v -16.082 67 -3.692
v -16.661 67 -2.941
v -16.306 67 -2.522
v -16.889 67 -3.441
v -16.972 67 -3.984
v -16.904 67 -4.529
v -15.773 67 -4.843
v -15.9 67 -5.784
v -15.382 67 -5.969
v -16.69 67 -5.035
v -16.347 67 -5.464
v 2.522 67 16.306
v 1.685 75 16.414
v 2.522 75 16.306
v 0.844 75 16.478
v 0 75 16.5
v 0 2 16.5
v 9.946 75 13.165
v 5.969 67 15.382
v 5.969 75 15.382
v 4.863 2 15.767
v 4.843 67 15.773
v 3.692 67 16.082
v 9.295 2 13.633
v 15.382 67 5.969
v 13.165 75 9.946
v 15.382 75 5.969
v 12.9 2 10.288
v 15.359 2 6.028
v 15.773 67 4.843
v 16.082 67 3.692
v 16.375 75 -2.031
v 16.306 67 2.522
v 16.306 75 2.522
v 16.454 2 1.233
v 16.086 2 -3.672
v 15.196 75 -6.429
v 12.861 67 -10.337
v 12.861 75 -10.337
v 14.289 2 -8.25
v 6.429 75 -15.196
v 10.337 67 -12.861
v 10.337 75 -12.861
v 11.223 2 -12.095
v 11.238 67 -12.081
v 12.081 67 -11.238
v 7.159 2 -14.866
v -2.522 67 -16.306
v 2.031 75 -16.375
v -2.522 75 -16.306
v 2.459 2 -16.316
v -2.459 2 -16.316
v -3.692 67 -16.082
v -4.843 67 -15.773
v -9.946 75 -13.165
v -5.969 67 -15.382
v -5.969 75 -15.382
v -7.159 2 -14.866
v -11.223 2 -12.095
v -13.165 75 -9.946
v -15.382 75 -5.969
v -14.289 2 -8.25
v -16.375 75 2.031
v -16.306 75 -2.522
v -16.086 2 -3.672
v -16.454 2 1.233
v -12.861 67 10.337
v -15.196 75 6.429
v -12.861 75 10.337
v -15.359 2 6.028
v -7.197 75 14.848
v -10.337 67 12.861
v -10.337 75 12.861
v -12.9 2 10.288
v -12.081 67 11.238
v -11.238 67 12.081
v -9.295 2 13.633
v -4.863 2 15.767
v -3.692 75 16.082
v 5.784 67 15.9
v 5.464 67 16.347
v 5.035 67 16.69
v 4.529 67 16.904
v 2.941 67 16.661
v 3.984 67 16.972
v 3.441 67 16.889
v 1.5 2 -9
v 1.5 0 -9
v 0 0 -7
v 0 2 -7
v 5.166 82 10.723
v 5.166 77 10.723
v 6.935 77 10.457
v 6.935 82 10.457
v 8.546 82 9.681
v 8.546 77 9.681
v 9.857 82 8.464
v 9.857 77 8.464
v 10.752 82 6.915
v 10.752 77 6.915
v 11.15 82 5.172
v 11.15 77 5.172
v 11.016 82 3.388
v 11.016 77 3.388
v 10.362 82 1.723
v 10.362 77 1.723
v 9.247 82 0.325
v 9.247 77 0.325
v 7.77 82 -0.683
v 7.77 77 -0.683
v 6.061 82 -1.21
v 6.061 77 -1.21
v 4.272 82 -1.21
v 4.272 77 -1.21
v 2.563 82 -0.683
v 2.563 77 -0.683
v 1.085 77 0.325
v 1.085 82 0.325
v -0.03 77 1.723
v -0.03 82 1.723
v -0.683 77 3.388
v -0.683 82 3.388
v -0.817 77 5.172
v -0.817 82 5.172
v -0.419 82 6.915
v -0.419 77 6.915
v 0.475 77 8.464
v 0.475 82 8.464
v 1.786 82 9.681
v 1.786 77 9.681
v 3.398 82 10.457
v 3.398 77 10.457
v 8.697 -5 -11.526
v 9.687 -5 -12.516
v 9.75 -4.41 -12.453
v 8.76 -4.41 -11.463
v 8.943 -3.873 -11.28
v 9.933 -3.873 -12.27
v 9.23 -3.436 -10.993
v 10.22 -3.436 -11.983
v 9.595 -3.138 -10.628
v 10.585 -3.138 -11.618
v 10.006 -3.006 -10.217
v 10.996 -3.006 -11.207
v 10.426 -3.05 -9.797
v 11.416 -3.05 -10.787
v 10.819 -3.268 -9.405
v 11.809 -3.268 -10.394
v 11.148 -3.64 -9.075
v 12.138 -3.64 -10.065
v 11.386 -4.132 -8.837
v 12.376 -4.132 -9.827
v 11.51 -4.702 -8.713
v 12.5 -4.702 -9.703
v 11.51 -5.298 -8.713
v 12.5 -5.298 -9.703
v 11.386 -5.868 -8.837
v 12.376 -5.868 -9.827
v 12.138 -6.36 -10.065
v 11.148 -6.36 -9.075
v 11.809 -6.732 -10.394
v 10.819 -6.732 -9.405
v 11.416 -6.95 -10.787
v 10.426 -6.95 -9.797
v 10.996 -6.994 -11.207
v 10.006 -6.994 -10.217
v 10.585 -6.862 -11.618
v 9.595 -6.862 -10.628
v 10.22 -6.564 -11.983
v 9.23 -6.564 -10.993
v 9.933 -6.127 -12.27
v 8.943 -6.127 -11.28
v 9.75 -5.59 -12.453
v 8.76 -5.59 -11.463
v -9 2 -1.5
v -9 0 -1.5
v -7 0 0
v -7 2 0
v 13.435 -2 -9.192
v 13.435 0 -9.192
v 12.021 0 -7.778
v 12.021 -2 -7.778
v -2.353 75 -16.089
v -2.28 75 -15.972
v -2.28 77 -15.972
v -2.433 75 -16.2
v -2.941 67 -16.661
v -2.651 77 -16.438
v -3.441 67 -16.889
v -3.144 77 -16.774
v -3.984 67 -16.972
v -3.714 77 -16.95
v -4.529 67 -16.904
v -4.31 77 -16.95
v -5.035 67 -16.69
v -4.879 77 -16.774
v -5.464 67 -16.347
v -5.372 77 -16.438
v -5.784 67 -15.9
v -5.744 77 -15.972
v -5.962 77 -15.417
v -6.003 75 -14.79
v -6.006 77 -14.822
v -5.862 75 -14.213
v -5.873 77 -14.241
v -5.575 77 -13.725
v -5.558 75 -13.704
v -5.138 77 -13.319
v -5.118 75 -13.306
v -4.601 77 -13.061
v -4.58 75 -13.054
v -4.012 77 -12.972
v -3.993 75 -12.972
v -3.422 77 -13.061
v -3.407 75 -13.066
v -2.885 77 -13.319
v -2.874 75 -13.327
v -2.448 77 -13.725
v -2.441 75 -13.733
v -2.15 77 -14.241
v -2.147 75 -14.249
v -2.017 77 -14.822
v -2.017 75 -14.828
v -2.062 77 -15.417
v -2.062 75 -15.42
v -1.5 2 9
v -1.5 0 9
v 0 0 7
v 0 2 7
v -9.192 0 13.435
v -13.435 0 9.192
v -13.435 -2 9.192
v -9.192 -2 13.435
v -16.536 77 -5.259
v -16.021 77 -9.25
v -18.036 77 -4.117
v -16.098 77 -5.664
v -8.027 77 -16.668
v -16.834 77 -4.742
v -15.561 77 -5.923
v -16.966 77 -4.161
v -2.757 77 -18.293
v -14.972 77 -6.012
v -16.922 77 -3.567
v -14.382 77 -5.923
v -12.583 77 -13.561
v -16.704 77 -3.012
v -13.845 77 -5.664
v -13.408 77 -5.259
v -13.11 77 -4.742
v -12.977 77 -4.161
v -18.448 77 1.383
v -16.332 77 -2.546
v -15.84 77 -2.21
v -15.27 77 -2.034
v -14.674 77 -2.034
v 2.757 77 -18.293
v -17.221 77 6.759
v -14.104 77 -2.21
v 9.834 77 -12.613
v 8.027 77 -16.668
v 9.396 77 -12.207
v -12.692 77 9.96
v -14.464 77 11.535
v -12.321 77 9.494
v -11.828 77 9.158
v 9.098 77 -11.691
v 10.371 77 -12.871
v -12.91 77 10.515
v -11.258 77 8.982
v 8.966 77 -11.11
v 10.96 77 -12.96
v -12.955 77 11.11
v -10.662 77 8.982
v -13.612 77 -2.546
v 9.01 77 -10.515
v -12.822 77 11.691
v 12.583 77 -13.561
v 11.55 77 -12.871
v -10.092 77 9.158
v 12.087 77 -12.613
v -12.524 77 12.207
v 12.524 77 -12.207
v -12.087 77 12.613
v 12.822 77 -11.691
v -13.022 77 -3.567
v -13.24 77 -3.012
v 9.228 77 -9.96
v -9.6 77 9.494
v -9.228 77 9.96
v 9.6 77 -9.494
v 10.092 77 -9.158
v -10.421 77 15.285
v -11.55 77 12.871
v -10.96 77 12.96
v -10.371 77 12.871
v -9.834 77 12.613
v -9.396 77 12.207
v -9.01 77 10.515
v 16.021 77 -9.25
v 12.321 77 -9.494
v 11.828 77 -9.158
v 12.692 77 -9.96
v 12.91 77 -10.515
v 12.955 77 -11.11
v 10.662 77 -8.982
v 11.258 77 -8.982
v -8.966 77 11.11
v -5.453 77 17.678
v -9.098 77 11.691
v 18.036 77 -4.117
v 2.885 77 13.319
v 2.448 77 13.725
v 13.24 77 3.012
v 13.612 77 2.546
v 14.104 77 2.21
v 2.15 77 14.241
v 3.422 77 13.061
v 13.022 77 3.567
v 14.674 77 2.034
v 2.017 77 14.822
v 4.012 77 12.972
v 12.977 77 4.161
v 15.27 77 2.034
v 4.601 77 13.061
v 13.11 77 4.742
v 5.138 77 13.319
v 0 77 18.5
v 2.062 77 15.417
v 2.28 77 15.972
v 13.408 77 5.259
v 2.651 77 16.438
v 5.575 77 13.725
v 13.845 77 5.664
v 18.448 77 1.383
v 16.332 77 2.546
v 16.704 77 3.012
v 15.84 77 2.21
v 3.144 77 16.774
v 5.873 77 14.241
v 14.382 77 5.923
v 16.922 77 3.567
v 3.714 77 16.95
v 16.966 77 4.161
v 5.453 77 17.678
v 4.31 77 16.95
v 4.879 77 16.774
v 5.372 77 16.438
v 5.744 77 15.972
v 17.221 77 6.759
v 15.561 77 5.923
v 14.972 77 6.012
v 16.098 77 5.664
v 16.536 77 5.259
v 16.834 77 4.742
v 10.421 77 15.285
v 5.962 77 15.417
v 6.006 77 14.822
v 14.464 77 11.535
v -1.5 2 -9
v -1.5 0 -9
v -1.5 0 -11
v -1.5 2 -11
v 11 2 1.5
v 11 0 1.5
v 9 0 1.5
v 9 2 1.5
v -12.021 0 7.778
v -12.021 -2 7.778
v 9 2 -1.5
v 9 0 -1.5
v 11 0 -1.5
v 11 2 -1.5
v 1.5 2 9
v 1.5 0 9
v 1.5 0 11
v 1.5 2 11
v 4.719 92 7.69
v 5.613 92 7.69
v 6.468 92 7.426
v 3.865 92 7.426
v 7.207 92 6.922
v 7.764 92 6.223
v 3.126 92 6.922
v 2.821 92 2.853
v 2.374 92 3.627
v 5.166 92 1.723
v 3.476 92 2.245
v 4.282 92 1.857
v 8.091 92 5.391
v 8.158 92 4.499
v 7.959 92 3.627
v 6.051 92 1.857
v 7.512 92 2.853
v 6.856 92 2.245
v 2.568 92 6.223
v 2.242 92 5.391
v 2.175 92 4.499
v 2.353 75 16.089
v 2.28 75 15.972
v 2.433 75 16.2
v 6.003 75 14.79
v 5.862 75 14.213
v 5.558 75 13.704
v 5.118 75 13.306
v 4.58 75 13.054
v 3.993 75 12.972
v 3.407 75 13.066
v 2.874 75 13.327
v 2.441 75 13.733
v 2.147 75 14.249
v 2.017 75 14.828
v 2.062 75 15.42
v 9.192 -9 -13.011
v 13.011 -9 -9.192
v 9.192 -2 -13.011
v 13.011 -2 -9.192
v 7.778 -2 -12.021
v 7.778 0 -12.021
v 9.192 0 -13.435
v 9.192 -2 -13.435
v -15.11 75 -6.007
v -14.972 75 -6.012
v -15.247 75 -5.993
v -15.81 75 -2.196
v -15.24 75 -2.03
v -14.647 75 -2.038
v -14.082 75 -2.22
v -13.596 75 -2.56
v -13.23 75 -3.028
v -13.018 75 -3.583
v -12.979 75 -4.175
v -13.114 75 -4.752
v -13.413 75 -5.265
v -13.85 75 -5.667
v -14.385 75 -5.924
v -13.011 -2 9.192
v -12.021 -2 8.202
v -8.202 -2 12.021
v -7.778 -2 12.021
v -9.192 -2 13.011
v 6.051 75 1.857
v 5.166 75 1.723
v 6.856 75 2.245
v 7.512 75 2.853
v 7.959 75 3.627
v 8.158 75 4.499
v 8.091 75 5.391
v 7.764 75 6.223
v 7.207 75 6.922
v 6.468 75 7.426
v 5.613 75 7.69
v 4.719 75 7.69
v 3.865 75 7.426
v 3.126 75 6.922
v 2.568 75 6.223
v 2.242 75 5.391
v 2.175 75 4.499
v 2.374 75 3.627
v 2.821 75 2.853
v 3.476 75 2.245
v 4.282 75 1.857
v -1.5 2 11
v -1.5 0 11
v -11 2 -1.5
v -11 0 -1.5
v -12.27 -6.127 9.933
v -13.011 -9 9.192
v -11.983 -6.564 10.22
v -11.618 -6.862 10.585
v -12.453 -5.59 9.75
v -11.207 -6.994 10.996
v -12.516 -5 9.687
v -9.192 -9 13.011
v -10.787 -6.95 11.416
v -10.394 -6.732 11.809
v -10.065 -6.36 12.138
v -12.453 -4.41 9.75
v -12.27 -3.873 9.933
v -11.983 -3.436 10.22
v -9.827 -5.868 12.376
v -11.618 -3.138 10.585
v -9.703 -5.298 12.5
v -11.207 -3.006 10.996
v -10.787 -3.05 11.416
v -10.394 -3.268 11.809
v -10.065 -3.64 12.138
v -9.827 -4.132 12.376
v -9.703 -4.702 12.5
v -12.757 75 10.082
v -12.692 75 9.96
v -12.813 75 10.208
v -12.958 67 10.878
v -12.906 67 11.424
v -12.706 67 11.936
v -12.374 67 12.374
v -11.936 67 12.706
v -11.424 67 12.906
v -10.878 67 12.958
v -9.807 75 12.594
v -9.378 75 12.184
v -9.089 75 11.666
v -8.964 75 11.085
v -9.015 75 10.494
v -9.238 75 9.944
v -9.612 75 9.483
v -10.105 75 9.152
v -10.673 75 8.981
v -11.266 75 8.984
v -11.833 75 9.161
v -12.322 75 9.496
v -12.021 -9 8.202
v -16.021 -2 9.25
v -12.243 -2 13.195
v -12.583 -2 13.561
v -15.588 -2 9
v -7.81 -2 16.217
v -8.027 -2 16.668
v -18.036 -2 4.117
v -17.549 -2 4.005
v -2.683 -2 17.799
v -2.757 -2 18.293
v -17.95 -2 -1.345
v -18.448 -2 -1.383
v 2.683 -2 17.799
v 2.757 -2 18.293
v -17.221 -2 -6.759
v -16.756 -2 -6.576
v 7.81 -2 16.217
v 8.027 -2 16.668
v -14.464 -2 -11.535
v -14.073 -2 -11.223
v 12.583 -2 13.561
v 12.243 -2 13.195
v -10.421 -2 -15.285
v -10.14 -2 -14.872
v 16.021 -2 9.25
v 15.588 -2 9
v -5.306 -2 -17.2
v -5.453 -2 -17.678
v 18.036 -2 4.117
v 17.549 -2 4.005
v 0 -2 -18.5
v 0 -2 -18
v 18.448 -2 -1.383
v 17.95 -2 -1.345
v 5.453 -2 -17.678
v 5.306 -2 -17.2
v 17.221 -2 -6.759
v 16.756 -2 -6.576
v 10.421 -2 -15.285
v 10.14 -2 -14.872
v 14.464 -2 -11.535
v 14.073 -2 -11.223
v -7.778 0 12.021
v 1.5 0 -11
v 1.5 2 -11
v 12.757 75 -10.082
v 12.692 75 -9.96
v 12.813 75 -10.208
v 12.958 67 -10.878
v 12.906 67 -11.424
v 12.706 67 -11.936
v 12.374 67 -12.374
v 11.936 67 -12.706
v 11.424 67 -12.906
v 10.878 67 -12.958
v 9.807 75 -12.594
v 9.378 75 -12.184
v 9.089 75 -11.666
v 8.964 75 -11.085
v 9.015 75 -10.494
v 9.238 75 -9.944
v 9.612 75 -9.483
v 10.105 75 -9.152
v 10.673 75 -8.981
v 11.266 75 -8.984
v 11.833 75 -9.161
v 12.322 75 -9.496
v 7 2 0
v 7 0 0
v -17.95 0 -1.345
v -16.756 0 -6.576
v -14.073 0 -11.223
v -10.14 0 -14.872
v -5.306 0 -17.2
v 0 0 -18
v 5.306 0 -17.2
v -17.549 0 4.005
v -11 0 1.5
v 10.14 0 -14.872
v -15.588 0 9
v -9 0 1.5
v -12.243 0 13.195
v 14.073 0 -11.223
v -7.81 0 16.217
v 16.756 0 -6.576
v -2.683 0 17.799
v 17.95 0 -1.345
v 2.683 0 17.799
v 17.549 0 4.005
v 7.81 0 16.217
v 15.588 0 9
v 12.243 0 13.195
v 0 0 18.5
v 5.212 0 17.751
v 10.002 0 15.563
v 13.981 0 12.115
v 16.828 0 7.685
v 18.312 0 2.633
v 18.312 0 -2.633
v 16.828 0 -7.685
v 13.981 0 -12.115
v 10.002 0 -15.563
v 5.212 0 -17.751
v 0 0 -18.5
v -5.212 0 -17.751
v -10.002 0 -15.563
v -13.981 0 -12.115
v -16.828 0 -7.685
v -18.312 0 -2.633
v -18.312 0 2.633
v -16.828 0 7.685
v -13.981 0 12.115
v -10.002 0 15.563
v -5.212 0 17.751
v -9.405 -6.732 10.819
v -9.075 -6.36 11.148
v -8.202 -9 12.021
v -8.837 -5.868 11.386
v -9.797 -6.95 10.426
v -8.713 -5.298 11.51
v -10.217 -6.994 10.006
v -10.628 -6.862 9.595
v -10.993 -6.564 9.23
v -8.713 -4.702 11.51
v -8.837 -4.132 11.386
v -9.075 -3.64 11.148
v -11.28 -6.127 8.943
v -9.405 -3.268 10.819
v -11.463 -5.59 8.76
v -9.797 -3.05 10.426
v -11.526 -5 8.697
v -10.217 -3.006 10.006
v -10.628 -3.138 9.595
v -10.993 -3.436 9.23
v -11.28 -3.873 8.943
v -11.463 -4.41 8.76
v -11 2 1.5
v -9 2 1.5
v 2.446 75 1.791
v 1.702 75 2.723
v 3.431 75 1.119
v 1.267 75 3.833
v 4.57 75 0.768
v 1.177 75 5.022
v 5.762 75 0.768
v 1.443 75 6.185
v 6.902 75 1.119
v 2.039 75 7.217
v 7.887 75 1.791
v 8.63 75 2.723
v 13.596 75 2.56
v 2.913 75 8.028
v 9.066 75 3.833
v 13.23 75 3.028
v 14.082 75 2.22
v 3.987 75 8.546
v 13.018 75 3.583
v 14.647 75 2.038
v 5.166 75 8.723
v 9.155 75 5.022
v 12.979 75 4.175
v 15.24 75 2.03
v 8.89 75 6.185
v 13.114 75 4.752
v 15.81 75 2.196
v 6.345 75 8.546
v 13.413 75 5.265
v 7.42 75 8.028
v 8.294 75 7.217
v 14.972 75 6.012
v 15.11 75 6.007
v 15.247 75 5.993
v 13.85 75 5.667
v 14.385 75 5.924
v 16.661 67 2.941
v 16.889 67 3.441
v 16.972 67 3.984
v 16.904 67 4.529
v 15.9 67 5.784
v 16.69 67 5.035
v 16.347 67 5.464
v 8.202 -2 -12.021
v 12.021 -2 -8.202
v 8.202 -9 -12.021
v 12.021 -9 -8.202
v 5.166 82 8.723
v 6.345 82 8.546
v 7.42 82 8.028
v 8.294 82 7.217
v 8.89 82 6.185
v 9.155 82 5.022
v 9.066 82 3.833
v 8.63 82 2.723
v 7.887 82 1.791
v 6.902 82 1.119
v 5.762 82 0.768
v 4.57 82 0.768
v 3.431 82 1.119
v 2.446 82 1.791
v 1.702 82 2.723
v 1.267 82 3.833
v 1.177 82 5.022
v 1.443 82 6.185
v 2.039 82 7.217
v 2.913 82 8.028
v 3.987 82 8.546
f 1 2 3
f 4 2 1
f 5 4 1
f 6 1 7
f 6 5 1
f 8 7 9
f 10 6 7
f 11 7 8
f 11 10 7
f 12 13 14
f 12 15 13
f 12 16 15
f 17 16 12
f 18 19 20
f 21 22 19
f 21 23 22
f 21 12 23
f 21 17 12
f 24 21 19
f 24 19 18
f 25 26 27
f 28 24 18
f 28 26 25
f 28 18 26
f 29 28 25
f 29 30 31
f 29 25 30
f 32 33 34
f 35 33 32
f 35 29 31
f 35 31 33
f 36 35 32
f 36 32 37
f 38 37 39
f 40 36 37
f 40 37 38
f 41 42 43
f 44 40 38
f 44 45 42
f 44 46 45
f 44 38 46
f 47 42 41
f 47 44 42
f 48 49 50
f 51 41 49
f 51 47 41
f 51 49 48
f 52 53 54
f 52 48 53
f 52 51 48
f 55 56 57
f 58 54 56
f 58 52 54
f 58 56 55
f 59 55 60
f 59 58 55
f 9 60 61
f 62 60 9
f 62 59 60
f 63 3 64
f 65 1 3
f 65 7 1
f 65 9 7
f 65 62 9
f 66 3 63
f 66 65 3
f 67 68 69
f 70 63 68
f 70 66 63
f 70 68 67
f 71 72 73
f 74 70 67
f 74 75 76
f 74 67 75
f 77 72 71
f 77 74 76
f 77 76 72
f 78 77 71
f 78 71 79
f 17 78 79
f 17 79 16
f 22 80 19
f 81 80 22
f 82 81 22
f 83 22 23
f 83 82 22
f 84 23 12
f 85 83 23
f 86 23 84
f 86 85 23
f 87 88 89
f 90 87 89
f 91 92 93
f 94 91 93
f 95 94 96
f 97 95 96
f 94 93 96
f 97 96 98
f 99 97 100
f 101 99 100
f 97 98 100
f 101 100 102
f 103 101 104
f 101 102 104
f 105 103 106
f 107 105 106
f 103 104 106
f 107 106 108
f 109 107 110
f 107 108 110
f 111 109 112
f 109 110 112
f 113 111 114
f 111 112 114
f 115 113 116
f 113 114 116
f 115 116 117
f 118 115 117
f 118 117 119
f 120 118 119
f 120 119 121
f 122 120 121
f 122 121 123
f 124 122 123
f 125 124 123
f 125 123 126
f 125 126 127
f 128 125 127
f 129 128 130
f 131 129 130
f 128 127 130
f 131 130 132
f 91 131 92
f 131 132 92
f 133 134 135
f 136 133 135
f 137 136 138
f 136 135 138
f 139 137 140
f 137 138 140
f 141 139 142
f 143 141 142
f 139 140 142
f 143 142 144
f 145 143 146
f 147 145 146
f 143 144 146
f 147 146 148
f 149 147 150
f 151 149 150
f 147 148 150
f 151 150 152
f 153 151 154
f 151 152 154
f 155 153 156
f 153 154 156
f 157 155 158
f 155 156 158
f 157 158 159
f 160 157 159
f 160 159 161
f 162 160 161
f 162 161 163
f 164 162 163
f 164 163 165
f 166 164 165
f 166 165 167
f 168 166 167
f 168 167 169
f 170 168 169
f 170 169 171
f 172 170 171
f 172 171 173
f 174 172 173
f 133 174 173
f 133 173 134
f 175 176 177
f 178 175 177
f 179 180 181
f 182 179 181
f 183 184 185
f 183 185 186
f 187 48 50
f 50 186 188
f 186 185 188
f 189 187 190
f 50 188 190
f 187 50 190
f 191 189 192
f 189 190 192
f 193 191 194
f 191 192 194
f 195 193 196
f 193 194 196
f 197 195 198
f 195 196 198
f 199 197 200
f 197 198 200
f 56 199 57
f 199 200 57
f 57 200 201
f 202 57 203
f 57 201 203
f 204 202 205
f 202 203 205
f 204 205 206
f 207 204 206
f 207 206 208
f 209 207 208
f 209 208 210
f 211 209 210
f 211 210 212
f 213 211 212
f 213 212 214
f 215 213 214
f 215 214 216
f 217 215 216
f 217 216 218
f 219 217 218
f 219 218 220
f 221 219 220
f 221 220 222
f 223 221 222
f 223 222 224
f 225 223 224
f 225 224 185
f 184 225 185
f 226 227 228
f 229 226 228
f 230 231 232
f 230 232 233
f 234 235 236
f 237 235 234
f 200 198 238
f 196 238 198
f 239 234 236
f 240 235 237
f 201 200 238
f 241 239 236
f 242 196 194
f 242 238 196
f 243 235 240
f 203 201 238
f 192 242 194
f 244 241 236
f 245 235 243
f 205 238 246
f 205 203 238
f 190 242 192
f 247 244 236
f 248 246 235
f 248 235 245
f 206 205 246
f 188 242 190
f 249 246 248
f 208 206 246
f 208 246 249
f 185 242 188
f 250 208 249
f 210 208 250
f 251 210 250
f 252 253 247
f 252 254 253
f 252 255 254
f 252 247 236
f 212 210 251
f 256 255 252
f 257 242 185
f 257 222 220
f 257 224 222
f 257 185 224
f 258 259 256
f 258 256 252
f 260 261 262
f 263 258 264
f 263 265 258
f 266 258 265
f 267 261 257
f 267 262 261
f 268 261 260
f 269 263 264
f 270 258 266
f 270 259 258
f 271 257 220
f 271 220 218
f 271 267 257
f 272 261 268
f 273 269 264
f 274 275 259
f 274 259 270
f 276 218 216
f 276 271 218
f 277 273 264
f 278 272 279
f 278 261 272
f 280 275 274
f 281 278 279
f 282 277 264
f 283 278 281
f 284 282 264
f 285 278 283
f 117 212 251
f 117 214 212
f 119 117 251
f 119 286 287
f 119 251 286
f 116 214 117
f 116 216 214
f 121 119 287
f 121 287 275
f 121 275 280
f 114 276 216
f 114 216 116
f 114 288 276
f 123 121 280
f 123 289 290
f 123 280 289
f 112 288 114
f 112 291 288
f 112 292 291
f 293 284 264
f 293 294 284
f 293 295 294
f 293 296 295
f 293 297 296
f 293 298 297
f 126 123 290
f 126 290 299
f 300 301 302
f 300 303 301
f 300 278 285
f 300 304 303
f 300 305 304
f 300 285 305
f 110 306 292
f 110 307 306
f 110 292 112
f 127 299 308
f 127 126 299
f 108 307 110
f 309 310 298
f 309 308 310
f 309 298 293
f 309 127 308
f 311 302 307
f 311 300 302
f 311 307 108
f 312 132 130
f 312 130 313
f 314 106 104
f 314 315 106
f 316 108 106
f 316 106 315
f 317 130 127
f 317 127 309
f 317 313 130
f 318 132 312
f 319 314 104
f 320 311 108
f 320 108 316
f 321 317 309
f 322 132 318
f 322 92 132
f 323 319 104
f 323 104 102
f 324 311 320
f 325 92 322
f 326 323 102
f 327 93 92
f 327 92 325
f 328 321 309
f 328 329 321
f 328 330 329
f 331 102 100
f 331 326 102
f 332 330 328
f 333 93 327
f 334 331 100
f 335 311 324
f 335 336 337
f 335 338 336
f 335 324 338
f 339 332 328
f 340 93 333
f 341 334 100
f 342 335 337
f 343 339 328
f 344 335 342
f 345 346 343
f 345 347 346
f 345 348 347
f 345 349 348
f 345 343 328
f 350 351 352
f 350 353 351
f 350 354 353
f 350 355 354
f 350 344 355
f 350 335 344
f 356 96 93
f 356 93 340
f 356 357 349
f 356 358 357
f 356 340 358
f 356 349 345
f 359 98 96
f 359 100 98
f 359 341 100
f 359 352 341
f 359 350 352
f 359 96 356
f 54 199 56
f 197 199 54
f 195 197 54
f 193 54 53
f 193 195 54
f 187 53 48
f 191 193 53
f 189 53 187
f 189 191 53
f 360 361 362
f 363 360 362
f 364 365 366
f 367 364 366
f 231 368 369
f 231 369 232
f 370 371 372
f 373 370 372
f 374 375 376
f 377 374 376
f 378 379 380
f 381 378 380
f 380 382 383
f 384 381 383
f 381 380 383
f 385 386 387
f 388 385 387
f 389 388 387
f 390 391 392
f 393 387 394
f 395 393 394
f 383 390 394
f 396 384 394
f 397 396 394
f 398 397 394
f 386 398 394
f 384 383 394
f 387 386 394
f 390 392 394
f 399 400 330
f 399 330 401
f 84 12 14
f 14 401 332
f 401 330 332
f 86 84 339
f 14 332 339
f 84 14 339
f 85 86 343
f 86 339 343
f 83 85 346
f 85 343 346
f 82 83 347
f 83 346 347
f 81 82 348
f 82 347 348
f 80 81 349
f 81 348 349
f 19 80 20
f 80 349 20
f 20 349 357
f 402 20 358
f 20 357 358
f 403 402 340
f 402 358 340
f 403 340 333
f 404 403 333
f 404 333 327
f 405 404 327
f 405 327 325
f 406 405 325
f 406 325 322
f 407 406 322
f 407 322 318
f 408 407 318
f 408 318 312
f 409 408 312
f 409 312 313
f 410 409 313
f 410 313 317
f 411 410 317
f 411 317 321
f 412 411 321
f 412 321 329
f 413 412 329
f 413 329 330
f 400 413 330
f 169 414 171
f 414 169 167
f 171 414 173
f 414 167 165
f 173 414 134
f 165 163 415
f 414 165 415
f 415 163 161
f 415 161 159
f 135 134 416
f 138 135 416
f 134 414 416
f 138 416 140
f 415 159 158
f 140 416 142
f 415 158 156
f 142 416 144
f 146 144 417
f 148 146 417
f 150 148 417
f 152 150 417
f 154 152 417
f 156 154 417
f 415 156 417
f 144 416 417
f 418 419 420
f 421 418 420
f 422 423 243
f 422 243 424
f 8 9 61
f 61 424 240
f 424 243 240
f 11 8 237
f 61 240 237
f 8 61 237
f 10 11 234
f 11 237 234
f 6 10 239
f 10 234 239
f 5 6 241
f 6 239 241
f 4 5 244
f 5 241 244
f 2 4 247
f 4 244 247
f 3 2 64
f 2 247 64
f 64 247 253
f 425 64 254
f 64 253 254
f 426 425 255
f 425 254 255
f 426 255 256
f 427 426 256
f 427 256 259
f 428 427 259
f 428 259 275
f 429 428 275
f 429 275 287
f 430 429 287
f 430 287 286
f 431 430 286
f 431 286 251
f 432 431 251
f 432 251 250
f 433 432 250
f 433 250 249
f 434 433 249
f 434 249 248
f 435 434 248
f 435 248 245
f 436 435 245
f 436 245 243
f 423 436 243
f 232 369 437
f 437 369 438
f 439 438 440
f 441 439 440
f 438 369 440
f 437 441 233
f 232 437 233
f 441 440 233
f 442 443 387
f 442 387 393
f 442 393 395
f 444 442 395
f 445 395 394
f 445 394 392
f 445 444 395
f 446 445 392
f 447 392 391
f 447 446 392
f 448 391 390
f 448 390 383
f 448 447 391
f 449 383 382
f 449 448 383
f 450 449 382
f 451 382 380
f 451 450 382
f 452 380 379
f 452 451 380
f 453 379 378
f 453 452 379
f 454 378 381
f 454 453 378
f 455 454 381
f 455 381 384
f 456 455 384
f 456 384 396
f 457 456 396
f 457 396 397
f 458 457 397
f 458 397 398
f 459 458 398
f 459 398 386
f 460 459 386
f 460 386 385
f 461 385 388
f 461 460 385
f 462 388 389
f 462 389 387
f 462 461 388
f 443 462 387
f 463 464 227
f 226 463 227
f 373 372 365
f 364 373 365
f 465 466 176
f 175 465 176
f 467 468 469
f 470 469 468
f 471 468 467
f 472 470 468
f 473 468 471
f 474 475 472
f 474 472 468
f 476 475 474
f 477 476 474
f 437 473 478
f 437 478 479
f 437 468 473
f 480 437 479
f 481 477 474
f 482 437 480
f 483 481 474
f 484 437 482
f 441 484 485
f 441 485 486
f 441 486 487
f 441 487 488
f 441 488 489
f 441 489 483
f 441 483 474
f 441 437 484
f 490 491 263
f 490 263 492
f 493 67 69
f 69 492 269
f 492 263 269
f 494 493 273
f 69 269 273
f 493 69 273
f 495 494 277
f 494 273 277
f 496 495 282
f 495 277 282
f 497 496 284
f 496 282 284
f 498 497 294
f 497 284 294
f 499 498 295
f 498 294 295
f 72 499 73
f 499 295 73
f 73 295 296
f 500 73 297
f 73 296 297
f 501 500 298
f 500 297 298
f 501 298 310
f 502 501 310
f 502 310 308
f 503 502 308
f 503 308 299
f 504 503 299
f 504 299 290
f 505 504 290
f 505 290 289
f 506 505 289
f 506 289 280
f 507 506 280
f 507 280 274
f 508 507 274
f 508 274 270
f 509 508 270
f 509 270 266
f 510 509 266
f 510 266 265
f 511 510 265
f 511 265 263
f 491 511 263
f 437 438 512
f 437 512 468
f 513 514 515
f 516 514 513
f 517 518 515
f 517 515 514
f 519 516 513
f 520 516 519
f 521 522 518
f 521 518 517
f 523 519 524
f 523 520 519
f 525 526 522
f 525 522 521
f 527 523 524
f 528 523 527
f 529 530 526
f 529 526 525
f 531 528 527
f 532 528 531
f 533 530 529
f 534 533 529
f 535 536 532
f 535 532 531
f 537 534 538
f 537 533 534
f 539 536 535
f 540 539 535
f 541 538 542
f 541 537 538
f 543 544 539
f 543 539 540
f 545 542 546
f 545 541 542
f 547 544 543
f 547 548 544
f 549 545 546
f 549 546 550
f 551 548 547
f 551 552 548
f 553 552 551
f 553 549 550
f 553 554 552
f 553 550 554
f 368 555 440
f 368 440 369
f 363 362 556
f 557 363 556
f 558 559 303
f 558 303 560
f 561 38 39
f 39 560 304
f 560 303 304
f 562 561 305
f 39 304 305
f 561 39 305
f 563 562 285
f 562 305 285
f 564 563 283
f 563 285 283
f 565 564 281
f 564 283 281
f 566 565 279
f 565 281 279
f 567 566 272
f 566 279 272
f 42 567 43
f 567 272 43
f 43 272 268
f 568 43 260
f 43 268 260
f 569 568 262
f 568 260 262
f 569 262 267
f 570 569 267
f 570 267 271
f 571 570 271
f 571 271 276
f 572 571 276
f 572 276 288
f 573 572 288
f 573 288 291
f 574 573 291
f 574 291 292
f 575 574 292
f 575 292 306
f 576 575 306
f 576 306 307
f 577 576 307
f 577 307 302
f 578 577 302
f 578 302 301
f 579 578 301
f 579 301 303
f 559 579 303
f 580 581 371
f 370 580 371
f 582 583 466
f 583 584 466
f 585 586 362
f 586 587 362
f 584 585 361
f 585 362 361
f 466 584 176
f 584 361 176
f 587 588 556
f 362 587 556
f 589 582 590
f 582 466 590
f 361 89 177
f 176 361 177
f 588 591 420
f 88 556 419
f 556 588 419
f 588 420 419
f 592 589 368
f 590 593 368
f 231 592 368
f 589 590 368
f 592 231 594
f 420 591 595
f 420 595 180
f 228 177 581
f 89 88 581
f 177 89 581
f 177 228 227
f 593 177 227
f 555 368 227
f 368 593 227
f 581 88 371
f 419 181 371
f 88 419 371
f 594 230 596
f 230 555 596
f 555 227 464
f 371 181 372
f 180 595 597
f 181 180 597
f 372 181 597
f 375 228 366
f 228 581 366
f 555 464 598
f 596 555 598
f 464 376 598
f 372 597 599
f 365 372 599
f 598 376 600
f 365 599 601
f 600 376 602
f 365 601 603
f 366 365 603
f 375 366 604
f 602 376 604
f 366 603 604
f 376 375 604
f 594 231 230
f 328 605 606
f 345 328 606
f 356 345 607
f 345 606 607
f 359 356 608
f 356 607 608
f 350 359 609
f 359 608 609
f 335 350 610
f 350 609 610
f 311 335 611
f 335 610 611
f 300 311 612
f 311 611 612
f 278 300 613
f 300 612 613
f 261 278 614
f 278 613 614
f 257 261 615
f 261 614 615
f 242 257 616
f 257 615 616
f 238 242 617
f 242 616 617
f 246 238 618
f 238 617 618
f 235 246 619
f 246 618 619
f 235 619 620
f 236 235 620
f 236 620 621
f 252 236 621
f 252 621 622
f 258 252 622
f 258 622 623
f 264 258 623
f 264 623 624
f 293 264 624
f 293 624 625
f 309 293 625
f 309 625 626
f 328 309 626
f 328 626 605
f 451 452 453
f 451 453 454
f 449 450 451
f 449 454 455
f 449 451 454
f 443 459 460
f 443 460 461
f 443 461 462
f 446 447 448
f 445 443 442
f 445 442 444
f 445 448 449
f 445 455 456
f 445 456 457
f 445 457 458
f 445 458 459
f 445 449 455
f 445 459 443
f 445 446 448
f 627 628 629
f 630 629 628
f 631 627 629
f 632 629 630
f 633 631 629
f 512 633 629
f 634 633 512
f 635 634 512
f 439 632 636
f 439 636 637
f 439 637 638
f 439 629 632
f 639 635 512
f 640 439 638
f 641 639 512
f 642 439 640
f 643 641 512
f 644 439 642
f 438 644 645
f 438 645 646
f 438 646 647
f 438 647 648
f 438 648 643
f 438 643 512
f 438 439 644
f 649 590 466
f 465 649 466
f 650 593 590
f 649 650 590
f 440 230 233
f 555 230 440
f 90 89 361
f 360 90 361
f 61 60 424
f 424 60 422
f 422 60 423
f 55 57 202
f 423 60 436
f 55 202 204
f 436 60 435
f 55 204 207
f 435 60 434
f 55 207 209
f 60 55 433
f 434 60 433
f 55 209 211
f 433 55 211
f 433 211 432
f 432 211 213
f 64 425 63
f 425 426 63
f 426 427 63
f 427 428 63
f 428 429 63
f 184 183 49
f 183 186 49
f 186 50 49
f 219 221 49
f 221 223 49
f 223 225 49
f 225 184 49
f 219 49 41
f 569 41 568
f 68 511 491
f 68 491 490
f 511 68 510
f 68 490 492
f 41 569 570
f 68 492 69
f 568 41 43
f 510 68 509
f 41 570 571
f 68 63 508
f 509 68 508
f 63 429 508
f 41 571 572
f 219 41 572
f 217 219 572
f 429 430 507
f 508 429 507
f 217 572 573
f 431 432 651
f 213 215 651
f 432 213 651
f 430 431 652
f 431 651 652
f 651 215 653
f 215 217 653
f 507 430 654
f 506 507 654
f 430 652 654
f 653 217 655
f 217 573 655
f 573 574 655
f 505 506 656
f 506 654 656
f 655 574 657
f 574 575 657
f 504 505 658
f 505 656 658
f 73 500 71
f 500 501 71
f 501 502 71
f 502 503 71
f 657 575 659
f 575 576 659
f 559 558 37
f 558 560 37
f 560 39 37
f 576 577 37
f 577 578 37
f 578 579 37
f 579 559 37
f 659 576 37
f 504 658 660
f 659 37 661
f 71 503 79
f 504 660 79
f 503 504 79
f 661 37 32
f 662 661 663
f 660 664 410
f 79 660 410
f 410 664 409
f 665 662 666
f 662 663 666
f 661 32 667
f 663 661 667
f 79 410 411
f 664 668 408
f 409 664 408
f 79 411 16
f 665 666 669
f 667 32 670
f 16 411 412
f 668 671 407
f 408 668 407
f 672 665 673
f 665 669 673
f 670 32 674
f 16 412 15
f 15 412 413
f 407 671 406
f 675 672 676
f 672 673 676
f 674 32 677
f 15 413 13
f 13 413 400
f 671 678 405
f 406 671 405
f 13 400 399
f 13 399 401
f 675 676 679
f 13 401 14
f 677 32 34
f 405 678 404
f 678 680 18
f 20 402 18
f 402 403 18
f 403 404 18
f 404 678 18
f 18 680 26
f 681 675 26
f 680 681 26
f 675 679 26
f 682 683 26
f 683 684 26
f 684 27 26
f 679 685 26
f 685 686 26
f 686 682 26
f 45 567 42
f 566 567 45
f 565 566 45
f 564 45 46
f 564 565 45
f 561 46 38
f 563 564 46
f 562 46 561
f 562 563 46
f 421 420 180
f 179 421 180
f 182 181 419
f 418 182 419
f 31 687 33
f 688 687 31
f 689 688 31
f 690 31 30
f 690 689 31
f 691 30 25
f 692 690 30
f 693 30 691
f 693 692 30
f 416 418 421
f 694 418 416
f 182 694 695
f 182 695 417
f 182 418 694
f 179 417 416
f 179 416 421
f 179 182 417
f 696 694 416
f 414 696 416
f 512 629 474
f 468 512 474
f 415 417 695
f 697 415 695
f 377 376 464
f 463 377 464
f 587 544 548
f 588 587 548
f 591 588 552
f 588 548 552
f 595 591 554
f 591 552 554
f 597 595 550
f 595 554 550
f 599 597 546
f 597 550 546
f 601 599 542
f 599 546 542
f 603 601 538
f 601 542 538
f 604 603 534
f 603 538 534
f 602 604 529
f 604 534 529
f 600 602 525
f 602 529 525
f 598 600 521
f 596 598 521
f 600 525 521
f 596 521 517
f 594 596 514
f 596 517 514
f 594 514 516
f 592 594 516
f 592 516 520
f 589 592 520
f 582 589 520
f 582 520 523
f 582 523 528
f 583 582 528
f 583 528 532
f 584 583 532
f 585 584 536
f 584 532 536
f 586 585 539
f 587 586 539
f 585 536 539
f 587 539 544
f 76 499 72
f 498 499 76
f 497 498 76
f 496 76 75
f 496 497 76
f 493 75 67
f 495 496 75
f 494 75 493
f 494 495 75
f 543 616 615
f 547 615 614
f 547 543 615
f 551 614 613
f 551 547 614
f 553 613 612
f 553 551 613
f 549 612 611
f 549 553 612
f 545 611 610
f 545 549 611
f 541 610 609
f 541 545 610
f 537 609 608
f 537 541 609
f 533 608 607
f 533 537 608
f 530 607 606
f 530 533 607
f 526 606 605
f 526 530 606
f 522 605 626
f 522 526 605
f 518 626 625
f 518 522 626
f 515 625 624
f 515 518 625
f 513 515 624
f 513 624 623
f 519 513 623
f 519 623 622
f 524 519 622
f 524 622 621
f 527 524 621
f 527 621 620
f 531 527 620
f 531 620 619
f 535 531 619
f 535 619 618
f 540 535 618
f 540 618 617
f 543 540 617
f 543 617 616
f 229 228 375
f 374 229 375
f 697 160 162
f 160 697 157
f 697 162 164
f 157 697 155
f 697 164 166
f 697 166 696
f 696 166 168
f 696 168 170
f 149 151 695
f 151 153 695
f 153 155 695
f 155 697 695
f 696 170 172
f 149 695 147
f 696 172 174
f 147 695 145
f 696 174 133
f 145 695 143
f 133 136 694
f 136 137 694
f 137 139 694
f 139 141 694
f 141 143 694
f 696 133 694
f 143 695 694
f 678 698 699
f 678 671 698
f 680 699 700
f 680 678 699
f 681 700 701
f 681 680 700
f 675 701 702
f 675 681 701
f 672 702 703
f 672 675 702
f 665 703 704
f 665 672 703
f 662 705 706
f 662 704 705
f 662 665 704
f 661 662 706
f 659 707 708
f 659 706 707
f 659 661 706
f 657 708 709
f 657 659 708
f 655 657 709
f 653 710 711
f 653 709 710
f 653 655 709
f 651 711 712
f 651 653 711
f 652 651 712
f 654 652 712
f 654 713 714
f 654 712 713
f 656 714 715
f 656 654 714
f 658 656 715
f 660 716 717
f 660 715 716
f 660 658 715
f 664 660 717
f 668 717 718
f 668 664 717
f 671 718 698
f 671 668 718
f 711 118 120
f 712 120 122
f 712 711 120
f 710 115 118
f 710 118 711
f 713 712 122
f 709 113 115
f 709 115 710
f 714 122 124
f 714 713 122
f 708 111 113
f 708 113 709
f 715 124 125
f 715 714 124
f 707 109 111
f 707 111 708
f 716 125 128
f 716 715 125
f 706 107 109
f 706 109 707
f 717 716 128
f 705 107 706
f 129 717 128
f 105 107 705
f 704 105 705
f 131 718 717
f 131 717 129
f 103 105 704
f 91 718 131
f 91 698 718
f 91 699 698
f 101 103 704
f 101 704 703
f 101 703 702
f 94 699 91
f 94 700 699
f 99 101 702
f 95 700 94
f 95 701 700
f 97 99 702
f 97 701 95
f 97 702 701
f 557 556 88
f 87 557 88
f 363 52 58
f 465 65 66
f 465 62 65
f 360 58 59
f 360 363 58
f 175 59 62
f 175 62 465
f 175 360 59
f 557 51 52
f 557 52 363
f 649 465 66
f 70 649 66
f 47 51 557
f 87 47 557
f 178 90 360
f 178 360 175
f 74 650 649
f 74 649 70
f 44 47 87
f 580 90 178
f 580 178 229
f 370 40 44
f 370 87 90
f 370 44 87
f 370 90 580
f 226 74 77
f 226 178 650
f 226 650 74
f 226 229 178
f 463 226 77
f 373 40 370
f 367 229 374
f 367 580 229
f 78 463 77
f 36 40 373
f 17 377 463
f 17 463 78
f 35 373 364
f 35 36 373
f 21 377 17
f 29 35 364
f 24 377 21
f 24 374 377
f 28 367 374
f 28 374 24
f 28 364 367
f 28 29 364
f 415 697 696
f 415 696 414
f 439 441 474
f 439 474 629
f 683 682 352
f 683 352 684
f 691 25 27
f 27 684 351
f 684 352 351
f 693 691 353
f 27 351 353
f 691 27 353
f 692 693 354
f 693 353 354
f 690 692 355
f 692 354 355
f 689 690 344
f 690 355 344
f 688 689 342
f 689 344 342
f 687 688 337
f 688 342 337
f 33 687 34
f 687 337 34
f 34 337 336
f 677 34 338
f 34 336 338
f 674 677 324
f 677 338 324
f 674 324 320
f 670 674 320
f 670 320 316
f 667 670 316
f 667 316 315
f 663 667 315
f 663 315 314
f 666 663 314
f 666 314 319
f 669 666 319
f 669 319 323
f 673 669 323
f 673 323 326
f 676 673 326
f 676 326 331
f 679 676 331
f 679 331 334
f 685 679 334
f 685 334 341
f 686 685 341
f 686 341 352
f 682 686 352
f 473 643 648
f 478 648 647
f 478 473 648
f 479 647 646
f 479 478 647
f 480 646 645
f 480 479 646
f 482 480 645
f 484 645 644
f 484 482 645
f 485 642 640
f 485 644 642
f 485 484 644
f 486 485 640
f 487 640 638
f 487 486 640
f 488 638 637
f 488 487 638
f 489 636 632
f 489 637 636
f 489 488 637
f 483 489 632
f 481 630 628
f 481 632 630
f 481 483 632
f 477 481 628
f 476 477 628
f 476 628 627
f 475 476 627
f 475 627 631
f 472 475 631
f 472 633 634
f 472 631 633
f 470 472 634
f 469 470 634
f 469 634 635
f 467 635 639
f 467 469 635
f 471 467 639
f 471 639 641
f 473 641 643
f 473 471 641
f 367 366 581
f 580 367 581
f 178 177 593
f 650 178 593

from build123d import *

# Parameters (mm, degrees)
SKETCH_1_R               = 18.5
EXTRUDE_1_DEPTH          = 77
SKETCH_2_R               = 6
EXTRUDE_2_DEPTH          = 5
SHELL_1_T                = -2
CUT_EXTRUDE_1_DEPTH      = 5
PATTERN_CIRCULAR_1_COUNT = 4
EXTRUDE_START            = 2
SKETCH_4_R               = 18.5
SKETCH_4_R_2             = 18
EXTRUDE_3_DEPTH          = 2
EXTRUDE_4_DEPTH          = 2
EXTRUDE_5_DEPTH          = 7
SKETCH_7_R               = 2
CUT_EXTRUDE_2_DEPTH      = 7
SKETCH_8_R               = 3
EXTRUDE_6_DEPTH          = 17
SKETCH_10_R              = 2
CUT_EXTRUDE_3_DEPTH      = 10
PATTERN_CIRCULAR_2_COUNT = 6


with BuildPart() as part:
    # 草图1 → 凸台-拉伸1 (new body)
    with BuildSketch(Plane(origin=(0, 0, 0), x_dir=(1, 0, 0), z_dir=(0, 1, 0))):
        Circle(SKETCH_1_R)
    extrude(amount=EXTRUDE_1_DEPTH)

    # 草图2 → 凸台-拉伸2 (add)
    with BuildSketch(Plane(origin=(0, 77, 0), x_dir=(1, 0, 0), z_dir=(0, 1, 0))):
        with Locations((5.166313479, -4.723262118)):
            Circle(SKETCH_2_R)
    extrude(amount=EXTRUDE_2_DEPTH)

    # 抽壳1
    shell_1_openings = [part.faces().sort_by_distance(p)[0] for p in [
        (5.166313479, 82, 4.723262118),
    ]]
    offset(amount=SHELL_1_T, openings=shell_1_openings, kind=Kind.INTERSECTION)

    # 草图3 → 切除-拉伸1 (cut)
    with BuildSketch(Plane.XZ):
        Polygon((9, 1.5), (7, 0), (9, -1.5), (11, -1.5), (11, 1.5), align=None)
    cut_extrude_1 = extrude(amount=-CUT_EXTRUDE_1_DEPTH, mode=Mode.SUBTRACT)

    # 阵列(圆周)1: 切除-拉伸1 ×4 about axis
    pattern_circular_1_axis = Axis((0, 77, 0), (0, -1, 0))
    for i in range(1, PATTERN_CIRCULAR_1_COUNT):
        add(cut_extrude_1.rotate(pattern_circular_1_axis, i * 360 / PATTERN_CIRCULAR_1_COUNT), mode=Mode.SUBTRACT)

    # 草图4 → 凸台-拉伸3 (add)
    with BuildSketch(Plane.XZ.offset(EXTRUDE_START)):
        Circle(SKETCH_4_R)
        Circle(SKETCH_4_R_2, mode=Mode.SUBTRACT)
    extrude(amount=-EXTRUDE_3_DEPTH)

    # 草图5 → 凸台-拉伸4 (add)
    with BuildSketch(Plane.XZ):
        Polygon((11.313708499, -11.313708499), (13.435028843, -9.192388155), (12.02081528, -7.778174593), (7.778174593, -12.02081528), (9.192388155, -13.435028843), align=None)
    extrude_4 = extrude(amount=EXTRUDE_4_DEPTH)

    # 草图6 → 凸台-拉伸5 (add)
    with BuildSketch(Plane.XZ.offset(2)):
        Polygon((9.192388155, -13.010764774), (13.010764774, -9.192388155), (12.02081528, -8.202438662), (8.202438662, -12.02081528), align=None)
    extrude_5 = extrude(amount=EXTRUDE_5_DEPTH)

    # 草图7 → 切除-拉伸2 (cut)
    with BuildSketch(Plane(origin=(11.101576465, 0, -11.101576465), x_dir=(-0.7071067811865509, 0, -0.7071067811865442), z_dir=(0.7071067811865442, 0, -0.7071067811865509))):
        with Locations((0, -5)):
            Circle(SKETCH_7_R)
    cut_extrude_2 = extrude(amount=-CUT_EXTRUDE_2_DEPTH, mode=Mode.SUBTRACT)

    # 镜向1: 凸台-拉伸4, 凸台-拉伸5, 切除-拉伸2 across plane
    add(extrude_4.mirror(Plane(origin=(0, 0, 0), x_dir=(0.707106781186551, 0, 0.707106781186544), z_dir=(-0.7071067811865442, 0, 0.7071067811865509))))
    add(extrude_5.mirror(Plane(origin=(0, 0, 0), x_dir=(0.707106781186551, 0, 0.707106781186544), z_dir=(-0.7071067811865442, 0, 0.7071067811865509))))
    add(cut_extrude_2.mirror(Plane(origin=(0, 0, 0), x_dir=(0.707106781186551, 0, 0.707106781186544), z_dir=(-0.7071067811865442, 0, 0.7071067811865509))), mode=Mode.SUBTRACT)

    # 草图10 → 切除-拉伸3 (cut)
    with BuildSketch(Plane(origin=(0, 77, 0), x_dir=(1, 0, 0), z_dir=(0, 1, 0))):
        with Locations((14.971850307, -4.011695199)):
            Circle(SKETCH_10_R)
    cut_extrude_3 = extrude(amount=-CUT_EXTRUDE_3_DEPTH, mode=Mode.SUBTRACT)

    # 阵列(圆周)2: 切除-拉伸3 ×6 about axis
    pattern_circular_2_axis = Axis((0, 77, 0), (0, -1, 0))
    for i in range(1, PATTERN_CIRCULAR_2_COUNT):
        add(cut_extrude_3.rotate(pattern_circular_2_axis, i * 360 / PATTERN_CIRCULAR_2_COUNT), mode=Mode.SUBTRACT)


with BuildPart() as body_2:
    # 草图8 → 凸台-拉伸6 (new body)
    with BuildSketch(Plane.XZ.offset(-75)):
        with Locations((5.166313479, 4.723262118)):
            Circle(SKETCH_8_R)
    extrude(amount=-EXTRUDE_6_DEPTH)


solid = Compound([part.part, body_2.part])
